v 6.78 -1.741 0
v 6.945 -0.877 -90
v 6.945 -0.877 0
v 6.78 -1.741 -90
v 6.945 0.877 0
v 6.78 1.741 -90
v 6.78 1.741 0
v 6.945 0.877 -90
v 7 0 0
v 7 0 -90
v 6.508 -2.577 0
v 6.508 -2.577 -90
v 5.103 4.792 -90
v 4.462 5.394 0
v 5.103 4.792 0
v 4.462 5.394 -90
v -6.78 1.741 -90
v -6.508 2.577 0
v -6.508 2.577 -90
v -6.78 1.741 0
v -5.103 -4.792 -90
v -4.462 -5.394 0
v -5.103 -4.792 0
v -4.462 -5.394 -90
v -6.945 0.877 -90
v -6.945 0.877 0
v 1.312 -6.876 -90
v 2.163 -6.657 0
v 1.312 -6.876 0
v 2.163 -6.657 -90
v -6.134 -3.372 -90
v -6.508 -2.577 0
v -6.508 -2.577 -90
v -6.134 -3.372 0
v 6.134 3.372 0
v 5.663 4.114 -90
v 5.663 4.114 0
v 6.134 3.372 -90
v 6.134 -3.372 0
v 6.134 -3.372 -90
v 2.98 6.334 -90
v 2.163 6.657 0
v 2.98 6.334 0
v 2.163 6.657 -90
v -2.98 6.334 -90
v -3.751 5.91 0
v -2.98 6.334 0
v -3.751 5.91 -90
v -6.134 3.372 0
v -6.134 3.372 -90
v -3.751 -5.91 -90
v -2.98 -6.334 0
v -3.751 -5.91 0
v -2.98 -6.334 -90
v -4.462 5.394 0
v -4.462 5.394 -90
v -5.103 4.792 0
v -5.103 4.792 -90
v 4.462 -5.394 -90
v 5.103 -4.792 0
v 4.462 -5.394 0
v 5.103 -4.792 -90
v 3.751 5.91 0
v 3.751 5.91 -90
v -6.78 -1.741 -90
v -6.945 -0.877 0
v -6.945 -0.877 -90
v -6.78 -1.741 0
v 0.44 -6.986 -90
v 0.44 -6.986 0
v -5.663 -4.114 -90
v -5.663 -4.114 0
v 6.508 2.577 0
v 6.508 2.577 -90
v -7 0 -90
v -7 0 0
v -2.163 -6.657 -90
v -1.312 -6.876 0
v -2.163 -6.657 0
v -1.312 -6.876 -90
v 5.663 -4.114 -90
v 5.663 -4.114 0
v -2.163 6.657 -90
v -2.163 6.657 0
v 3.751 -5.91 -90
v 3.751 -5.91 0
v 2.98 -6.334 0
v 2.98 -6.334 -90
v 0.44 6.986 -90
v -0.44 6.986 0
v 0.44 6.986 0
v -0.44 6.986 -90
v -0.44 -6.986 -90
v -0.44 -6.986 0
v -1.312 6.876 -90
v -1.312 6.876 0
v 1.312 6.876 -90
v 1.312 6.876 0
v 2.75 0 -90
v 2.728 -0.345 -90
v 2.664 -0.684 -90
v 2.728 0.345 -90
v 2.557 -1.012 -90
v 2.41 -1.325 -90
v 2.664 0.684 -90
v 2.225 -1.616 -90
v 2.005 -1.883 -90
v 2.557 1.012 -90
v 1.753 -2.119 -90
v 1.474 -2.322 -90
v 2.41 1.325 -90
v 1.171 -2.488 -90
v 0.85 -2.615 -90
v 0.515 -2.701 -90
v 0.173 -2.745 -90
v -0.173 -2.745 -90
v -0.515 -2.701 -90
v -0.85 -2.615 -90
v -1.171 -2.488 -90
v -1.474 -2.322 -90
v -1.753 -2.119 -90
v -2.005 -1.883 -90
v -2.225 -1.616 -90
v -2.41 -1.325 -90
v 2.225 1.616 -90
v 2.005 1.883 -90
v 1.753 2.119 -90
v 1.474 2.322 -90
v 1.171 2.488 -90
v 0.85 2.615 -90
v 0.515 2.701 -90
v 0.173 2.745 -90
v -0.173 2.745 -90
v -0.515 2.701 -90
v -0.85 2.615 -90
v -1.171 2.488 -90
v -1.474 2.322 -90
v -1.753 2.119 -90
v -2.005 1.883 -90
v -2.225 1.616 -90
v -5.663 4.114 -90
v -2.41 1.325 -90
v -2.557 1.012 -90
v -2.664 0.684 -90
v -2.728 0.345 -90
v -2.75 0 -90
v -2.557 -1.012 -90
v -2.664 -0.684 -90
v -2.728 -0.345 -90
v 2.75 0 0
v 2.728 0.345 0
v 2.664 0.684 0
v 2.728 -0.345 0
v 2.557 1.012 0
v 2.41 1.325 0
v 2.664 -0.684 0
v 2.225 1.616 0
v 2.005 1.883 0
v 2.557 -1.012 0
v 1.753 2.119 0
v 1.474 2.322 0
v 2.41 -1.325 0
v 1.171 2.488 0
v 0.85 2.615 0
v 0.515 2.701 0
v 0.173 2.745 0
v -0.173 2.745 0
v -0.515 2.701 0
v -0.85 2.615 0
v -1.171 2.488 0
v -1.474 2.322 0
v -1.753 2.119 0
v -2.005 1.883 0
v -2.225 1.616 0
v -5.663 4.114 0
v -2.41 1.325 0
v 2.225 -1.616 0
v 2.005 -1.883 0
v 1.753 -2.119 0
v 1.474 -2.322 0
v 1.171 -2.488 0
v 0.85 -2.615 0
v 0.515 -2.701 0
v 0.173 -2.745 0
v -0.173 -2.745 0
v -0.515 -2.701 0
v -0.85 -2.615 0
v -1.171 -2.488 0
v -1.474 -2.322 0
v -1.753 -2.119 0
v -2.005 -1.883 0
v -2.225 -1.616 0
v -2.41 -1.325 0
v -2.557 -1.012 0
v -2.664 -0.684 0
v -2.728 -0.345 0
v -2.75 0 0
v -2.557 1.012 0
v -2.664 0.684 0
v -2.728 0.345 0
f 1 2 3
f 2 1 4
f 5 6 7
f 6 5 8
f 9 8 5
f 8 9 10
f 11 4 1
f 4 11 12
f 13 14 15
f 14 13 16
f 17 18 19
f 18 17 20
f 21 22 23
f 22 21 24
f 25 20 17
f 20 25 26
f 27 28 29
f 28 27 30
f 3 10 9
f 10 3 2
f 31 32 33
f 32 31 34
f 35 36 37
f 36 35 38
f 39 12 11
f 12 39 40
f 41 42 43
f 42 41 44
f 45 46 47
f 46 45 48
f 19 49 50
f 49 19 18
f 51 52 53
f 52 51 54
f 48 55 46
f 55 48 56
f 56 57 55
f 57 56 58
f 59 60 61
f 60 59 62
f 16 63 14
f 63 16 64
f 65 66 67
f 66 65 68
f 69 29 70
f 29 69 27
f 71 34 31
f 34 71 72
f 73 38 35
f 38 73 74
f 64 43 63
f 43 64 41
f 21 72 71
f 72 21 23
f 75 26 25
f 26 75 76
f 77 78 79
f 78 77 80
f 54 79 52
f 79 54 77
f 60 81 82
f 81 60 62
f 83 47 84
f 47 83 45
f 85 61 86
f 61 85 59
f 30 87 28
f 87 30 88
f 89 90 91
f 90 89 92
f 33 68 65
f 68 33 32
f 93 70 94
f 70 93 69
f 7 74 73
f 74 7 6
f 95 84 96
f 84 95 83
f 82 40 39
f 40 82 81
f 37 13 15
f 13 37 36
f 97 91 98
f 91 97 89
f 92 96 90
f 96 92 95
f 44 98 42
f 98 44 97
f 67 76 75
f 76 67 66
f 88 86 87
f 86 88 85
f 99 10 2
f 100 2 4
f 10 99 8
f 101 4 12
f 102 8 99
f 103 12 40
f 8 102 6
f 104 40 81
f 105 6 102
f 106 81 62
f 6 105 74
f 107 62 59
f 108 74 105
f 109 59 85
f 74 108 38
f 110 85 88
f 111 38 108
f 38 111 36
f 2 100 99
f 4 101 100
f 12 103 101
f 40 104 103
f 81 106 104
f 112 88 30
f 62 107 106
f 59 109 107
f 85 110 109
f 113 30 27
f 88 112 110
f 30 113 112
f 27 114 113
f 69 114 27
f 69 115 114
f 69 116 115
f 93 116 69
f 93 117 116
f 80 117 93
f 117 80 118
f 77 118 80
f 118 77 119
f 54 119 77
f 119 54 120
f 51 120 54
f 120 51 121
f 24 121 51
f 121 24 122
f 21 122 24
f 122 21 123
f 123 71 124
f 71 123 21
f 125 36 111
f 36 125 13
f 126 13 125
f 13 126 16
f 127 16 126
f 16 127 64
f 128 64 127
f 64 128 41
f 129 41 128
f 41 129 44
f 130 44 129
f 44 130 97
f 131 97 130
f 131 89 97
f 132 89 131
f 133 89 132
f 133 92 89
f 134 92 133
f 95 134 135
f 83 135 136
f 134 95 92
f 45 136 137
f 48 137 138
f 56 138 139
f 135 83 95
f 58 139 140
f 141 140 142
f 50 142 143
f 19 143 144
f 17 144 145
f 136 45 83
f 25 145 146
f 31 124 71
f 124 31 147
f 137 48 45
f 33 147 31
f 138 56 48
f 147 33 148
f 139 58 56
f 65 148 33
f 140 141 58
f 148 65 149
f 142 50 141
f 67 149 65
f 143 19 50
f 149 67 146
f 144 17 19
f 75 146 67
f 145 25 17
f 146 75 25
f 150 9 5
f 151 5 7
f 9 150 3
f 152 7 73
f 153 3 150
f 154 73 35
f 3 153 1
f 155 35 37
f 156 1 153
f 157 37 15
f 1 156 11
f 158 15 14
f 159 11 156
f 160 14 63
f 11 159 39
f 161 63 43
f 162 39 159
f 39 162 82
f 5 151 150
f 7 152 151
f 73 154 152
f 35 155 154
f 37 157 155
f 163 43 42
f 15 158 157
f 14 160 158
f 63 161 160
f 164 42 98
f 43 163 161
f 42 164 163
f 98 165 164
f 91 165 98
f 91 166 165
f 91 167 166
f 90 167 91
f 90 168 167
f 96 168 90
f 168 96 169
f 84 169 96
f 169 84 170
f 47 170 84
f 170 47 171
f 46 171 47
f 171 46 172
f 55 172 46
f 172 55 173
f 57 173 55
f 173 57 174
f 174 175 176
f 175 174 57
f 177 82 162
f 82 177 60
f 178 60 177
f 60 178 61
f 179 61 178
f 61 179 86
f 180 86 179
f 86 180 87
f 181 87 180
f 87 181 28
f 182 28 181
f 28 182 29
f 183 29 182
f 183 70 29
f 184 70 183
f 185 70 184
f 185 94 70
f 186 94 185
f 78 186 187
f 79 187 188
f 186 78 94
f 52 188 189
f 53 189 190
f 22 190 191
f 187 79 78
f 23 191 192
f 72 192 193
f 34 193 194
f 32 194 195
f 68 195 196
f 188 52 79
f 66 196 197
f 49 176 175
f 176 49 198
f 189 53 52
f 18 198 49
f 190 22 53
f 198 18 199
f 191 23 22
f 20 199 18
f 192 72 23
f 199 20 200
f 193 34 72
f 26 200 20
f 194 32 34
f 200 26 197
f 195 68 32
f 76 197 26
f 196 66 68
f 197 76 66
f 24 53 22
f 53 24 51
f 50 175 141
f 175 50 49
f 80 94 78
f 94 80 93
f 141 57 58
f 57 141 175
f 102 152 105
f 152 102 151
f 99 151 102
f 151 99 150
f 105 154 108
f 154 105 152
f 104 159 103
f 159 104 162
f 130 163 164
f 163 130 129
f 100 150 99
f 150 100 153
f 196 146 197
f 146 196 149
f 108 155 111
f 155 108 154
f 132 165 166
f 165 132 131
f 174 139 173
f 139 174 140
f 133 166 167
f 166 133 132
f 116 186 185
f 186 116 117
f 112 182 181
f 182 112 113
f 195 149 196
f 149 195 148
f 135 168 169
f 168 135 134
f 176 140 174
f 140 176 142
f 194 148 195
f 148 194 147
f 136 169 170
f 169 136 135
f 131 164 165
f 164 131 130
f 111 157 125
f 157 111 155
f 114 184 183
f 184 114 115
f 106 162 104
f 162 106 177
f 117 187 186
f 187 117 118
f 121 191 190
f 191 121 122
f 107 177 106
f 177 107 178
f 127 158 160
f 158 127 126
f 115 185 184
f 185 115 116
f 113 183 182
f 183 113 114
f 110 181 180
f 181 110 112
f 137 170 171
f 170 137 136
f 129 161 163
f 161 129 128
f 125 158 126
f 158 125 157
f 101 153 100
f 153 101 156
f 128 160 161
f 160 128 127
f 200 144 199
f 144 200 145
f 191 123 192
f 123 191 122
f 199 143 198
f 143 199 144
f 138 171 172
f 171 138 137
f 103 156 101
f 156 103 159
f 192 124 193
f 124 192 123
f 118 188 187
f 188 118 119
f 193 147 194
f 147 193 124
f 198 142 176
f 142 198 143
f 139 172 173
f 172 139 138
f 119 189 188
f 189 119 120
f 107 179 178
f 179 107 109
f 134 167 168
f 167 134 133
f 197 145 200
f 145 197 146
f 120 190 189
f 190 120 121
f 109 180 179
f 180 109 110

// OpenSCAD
$fn = 50;


difference() {
	union() {
		translate(v = [0, 0, -90.0000000000]) {
			cylinder(h = 90, r = 7.0000000000);
		}
	}
	union() {
		#translate(v = [0, 0, -90]) {
			cylinder(h = 90, r = 2.7500000000);
		}
	}
}
